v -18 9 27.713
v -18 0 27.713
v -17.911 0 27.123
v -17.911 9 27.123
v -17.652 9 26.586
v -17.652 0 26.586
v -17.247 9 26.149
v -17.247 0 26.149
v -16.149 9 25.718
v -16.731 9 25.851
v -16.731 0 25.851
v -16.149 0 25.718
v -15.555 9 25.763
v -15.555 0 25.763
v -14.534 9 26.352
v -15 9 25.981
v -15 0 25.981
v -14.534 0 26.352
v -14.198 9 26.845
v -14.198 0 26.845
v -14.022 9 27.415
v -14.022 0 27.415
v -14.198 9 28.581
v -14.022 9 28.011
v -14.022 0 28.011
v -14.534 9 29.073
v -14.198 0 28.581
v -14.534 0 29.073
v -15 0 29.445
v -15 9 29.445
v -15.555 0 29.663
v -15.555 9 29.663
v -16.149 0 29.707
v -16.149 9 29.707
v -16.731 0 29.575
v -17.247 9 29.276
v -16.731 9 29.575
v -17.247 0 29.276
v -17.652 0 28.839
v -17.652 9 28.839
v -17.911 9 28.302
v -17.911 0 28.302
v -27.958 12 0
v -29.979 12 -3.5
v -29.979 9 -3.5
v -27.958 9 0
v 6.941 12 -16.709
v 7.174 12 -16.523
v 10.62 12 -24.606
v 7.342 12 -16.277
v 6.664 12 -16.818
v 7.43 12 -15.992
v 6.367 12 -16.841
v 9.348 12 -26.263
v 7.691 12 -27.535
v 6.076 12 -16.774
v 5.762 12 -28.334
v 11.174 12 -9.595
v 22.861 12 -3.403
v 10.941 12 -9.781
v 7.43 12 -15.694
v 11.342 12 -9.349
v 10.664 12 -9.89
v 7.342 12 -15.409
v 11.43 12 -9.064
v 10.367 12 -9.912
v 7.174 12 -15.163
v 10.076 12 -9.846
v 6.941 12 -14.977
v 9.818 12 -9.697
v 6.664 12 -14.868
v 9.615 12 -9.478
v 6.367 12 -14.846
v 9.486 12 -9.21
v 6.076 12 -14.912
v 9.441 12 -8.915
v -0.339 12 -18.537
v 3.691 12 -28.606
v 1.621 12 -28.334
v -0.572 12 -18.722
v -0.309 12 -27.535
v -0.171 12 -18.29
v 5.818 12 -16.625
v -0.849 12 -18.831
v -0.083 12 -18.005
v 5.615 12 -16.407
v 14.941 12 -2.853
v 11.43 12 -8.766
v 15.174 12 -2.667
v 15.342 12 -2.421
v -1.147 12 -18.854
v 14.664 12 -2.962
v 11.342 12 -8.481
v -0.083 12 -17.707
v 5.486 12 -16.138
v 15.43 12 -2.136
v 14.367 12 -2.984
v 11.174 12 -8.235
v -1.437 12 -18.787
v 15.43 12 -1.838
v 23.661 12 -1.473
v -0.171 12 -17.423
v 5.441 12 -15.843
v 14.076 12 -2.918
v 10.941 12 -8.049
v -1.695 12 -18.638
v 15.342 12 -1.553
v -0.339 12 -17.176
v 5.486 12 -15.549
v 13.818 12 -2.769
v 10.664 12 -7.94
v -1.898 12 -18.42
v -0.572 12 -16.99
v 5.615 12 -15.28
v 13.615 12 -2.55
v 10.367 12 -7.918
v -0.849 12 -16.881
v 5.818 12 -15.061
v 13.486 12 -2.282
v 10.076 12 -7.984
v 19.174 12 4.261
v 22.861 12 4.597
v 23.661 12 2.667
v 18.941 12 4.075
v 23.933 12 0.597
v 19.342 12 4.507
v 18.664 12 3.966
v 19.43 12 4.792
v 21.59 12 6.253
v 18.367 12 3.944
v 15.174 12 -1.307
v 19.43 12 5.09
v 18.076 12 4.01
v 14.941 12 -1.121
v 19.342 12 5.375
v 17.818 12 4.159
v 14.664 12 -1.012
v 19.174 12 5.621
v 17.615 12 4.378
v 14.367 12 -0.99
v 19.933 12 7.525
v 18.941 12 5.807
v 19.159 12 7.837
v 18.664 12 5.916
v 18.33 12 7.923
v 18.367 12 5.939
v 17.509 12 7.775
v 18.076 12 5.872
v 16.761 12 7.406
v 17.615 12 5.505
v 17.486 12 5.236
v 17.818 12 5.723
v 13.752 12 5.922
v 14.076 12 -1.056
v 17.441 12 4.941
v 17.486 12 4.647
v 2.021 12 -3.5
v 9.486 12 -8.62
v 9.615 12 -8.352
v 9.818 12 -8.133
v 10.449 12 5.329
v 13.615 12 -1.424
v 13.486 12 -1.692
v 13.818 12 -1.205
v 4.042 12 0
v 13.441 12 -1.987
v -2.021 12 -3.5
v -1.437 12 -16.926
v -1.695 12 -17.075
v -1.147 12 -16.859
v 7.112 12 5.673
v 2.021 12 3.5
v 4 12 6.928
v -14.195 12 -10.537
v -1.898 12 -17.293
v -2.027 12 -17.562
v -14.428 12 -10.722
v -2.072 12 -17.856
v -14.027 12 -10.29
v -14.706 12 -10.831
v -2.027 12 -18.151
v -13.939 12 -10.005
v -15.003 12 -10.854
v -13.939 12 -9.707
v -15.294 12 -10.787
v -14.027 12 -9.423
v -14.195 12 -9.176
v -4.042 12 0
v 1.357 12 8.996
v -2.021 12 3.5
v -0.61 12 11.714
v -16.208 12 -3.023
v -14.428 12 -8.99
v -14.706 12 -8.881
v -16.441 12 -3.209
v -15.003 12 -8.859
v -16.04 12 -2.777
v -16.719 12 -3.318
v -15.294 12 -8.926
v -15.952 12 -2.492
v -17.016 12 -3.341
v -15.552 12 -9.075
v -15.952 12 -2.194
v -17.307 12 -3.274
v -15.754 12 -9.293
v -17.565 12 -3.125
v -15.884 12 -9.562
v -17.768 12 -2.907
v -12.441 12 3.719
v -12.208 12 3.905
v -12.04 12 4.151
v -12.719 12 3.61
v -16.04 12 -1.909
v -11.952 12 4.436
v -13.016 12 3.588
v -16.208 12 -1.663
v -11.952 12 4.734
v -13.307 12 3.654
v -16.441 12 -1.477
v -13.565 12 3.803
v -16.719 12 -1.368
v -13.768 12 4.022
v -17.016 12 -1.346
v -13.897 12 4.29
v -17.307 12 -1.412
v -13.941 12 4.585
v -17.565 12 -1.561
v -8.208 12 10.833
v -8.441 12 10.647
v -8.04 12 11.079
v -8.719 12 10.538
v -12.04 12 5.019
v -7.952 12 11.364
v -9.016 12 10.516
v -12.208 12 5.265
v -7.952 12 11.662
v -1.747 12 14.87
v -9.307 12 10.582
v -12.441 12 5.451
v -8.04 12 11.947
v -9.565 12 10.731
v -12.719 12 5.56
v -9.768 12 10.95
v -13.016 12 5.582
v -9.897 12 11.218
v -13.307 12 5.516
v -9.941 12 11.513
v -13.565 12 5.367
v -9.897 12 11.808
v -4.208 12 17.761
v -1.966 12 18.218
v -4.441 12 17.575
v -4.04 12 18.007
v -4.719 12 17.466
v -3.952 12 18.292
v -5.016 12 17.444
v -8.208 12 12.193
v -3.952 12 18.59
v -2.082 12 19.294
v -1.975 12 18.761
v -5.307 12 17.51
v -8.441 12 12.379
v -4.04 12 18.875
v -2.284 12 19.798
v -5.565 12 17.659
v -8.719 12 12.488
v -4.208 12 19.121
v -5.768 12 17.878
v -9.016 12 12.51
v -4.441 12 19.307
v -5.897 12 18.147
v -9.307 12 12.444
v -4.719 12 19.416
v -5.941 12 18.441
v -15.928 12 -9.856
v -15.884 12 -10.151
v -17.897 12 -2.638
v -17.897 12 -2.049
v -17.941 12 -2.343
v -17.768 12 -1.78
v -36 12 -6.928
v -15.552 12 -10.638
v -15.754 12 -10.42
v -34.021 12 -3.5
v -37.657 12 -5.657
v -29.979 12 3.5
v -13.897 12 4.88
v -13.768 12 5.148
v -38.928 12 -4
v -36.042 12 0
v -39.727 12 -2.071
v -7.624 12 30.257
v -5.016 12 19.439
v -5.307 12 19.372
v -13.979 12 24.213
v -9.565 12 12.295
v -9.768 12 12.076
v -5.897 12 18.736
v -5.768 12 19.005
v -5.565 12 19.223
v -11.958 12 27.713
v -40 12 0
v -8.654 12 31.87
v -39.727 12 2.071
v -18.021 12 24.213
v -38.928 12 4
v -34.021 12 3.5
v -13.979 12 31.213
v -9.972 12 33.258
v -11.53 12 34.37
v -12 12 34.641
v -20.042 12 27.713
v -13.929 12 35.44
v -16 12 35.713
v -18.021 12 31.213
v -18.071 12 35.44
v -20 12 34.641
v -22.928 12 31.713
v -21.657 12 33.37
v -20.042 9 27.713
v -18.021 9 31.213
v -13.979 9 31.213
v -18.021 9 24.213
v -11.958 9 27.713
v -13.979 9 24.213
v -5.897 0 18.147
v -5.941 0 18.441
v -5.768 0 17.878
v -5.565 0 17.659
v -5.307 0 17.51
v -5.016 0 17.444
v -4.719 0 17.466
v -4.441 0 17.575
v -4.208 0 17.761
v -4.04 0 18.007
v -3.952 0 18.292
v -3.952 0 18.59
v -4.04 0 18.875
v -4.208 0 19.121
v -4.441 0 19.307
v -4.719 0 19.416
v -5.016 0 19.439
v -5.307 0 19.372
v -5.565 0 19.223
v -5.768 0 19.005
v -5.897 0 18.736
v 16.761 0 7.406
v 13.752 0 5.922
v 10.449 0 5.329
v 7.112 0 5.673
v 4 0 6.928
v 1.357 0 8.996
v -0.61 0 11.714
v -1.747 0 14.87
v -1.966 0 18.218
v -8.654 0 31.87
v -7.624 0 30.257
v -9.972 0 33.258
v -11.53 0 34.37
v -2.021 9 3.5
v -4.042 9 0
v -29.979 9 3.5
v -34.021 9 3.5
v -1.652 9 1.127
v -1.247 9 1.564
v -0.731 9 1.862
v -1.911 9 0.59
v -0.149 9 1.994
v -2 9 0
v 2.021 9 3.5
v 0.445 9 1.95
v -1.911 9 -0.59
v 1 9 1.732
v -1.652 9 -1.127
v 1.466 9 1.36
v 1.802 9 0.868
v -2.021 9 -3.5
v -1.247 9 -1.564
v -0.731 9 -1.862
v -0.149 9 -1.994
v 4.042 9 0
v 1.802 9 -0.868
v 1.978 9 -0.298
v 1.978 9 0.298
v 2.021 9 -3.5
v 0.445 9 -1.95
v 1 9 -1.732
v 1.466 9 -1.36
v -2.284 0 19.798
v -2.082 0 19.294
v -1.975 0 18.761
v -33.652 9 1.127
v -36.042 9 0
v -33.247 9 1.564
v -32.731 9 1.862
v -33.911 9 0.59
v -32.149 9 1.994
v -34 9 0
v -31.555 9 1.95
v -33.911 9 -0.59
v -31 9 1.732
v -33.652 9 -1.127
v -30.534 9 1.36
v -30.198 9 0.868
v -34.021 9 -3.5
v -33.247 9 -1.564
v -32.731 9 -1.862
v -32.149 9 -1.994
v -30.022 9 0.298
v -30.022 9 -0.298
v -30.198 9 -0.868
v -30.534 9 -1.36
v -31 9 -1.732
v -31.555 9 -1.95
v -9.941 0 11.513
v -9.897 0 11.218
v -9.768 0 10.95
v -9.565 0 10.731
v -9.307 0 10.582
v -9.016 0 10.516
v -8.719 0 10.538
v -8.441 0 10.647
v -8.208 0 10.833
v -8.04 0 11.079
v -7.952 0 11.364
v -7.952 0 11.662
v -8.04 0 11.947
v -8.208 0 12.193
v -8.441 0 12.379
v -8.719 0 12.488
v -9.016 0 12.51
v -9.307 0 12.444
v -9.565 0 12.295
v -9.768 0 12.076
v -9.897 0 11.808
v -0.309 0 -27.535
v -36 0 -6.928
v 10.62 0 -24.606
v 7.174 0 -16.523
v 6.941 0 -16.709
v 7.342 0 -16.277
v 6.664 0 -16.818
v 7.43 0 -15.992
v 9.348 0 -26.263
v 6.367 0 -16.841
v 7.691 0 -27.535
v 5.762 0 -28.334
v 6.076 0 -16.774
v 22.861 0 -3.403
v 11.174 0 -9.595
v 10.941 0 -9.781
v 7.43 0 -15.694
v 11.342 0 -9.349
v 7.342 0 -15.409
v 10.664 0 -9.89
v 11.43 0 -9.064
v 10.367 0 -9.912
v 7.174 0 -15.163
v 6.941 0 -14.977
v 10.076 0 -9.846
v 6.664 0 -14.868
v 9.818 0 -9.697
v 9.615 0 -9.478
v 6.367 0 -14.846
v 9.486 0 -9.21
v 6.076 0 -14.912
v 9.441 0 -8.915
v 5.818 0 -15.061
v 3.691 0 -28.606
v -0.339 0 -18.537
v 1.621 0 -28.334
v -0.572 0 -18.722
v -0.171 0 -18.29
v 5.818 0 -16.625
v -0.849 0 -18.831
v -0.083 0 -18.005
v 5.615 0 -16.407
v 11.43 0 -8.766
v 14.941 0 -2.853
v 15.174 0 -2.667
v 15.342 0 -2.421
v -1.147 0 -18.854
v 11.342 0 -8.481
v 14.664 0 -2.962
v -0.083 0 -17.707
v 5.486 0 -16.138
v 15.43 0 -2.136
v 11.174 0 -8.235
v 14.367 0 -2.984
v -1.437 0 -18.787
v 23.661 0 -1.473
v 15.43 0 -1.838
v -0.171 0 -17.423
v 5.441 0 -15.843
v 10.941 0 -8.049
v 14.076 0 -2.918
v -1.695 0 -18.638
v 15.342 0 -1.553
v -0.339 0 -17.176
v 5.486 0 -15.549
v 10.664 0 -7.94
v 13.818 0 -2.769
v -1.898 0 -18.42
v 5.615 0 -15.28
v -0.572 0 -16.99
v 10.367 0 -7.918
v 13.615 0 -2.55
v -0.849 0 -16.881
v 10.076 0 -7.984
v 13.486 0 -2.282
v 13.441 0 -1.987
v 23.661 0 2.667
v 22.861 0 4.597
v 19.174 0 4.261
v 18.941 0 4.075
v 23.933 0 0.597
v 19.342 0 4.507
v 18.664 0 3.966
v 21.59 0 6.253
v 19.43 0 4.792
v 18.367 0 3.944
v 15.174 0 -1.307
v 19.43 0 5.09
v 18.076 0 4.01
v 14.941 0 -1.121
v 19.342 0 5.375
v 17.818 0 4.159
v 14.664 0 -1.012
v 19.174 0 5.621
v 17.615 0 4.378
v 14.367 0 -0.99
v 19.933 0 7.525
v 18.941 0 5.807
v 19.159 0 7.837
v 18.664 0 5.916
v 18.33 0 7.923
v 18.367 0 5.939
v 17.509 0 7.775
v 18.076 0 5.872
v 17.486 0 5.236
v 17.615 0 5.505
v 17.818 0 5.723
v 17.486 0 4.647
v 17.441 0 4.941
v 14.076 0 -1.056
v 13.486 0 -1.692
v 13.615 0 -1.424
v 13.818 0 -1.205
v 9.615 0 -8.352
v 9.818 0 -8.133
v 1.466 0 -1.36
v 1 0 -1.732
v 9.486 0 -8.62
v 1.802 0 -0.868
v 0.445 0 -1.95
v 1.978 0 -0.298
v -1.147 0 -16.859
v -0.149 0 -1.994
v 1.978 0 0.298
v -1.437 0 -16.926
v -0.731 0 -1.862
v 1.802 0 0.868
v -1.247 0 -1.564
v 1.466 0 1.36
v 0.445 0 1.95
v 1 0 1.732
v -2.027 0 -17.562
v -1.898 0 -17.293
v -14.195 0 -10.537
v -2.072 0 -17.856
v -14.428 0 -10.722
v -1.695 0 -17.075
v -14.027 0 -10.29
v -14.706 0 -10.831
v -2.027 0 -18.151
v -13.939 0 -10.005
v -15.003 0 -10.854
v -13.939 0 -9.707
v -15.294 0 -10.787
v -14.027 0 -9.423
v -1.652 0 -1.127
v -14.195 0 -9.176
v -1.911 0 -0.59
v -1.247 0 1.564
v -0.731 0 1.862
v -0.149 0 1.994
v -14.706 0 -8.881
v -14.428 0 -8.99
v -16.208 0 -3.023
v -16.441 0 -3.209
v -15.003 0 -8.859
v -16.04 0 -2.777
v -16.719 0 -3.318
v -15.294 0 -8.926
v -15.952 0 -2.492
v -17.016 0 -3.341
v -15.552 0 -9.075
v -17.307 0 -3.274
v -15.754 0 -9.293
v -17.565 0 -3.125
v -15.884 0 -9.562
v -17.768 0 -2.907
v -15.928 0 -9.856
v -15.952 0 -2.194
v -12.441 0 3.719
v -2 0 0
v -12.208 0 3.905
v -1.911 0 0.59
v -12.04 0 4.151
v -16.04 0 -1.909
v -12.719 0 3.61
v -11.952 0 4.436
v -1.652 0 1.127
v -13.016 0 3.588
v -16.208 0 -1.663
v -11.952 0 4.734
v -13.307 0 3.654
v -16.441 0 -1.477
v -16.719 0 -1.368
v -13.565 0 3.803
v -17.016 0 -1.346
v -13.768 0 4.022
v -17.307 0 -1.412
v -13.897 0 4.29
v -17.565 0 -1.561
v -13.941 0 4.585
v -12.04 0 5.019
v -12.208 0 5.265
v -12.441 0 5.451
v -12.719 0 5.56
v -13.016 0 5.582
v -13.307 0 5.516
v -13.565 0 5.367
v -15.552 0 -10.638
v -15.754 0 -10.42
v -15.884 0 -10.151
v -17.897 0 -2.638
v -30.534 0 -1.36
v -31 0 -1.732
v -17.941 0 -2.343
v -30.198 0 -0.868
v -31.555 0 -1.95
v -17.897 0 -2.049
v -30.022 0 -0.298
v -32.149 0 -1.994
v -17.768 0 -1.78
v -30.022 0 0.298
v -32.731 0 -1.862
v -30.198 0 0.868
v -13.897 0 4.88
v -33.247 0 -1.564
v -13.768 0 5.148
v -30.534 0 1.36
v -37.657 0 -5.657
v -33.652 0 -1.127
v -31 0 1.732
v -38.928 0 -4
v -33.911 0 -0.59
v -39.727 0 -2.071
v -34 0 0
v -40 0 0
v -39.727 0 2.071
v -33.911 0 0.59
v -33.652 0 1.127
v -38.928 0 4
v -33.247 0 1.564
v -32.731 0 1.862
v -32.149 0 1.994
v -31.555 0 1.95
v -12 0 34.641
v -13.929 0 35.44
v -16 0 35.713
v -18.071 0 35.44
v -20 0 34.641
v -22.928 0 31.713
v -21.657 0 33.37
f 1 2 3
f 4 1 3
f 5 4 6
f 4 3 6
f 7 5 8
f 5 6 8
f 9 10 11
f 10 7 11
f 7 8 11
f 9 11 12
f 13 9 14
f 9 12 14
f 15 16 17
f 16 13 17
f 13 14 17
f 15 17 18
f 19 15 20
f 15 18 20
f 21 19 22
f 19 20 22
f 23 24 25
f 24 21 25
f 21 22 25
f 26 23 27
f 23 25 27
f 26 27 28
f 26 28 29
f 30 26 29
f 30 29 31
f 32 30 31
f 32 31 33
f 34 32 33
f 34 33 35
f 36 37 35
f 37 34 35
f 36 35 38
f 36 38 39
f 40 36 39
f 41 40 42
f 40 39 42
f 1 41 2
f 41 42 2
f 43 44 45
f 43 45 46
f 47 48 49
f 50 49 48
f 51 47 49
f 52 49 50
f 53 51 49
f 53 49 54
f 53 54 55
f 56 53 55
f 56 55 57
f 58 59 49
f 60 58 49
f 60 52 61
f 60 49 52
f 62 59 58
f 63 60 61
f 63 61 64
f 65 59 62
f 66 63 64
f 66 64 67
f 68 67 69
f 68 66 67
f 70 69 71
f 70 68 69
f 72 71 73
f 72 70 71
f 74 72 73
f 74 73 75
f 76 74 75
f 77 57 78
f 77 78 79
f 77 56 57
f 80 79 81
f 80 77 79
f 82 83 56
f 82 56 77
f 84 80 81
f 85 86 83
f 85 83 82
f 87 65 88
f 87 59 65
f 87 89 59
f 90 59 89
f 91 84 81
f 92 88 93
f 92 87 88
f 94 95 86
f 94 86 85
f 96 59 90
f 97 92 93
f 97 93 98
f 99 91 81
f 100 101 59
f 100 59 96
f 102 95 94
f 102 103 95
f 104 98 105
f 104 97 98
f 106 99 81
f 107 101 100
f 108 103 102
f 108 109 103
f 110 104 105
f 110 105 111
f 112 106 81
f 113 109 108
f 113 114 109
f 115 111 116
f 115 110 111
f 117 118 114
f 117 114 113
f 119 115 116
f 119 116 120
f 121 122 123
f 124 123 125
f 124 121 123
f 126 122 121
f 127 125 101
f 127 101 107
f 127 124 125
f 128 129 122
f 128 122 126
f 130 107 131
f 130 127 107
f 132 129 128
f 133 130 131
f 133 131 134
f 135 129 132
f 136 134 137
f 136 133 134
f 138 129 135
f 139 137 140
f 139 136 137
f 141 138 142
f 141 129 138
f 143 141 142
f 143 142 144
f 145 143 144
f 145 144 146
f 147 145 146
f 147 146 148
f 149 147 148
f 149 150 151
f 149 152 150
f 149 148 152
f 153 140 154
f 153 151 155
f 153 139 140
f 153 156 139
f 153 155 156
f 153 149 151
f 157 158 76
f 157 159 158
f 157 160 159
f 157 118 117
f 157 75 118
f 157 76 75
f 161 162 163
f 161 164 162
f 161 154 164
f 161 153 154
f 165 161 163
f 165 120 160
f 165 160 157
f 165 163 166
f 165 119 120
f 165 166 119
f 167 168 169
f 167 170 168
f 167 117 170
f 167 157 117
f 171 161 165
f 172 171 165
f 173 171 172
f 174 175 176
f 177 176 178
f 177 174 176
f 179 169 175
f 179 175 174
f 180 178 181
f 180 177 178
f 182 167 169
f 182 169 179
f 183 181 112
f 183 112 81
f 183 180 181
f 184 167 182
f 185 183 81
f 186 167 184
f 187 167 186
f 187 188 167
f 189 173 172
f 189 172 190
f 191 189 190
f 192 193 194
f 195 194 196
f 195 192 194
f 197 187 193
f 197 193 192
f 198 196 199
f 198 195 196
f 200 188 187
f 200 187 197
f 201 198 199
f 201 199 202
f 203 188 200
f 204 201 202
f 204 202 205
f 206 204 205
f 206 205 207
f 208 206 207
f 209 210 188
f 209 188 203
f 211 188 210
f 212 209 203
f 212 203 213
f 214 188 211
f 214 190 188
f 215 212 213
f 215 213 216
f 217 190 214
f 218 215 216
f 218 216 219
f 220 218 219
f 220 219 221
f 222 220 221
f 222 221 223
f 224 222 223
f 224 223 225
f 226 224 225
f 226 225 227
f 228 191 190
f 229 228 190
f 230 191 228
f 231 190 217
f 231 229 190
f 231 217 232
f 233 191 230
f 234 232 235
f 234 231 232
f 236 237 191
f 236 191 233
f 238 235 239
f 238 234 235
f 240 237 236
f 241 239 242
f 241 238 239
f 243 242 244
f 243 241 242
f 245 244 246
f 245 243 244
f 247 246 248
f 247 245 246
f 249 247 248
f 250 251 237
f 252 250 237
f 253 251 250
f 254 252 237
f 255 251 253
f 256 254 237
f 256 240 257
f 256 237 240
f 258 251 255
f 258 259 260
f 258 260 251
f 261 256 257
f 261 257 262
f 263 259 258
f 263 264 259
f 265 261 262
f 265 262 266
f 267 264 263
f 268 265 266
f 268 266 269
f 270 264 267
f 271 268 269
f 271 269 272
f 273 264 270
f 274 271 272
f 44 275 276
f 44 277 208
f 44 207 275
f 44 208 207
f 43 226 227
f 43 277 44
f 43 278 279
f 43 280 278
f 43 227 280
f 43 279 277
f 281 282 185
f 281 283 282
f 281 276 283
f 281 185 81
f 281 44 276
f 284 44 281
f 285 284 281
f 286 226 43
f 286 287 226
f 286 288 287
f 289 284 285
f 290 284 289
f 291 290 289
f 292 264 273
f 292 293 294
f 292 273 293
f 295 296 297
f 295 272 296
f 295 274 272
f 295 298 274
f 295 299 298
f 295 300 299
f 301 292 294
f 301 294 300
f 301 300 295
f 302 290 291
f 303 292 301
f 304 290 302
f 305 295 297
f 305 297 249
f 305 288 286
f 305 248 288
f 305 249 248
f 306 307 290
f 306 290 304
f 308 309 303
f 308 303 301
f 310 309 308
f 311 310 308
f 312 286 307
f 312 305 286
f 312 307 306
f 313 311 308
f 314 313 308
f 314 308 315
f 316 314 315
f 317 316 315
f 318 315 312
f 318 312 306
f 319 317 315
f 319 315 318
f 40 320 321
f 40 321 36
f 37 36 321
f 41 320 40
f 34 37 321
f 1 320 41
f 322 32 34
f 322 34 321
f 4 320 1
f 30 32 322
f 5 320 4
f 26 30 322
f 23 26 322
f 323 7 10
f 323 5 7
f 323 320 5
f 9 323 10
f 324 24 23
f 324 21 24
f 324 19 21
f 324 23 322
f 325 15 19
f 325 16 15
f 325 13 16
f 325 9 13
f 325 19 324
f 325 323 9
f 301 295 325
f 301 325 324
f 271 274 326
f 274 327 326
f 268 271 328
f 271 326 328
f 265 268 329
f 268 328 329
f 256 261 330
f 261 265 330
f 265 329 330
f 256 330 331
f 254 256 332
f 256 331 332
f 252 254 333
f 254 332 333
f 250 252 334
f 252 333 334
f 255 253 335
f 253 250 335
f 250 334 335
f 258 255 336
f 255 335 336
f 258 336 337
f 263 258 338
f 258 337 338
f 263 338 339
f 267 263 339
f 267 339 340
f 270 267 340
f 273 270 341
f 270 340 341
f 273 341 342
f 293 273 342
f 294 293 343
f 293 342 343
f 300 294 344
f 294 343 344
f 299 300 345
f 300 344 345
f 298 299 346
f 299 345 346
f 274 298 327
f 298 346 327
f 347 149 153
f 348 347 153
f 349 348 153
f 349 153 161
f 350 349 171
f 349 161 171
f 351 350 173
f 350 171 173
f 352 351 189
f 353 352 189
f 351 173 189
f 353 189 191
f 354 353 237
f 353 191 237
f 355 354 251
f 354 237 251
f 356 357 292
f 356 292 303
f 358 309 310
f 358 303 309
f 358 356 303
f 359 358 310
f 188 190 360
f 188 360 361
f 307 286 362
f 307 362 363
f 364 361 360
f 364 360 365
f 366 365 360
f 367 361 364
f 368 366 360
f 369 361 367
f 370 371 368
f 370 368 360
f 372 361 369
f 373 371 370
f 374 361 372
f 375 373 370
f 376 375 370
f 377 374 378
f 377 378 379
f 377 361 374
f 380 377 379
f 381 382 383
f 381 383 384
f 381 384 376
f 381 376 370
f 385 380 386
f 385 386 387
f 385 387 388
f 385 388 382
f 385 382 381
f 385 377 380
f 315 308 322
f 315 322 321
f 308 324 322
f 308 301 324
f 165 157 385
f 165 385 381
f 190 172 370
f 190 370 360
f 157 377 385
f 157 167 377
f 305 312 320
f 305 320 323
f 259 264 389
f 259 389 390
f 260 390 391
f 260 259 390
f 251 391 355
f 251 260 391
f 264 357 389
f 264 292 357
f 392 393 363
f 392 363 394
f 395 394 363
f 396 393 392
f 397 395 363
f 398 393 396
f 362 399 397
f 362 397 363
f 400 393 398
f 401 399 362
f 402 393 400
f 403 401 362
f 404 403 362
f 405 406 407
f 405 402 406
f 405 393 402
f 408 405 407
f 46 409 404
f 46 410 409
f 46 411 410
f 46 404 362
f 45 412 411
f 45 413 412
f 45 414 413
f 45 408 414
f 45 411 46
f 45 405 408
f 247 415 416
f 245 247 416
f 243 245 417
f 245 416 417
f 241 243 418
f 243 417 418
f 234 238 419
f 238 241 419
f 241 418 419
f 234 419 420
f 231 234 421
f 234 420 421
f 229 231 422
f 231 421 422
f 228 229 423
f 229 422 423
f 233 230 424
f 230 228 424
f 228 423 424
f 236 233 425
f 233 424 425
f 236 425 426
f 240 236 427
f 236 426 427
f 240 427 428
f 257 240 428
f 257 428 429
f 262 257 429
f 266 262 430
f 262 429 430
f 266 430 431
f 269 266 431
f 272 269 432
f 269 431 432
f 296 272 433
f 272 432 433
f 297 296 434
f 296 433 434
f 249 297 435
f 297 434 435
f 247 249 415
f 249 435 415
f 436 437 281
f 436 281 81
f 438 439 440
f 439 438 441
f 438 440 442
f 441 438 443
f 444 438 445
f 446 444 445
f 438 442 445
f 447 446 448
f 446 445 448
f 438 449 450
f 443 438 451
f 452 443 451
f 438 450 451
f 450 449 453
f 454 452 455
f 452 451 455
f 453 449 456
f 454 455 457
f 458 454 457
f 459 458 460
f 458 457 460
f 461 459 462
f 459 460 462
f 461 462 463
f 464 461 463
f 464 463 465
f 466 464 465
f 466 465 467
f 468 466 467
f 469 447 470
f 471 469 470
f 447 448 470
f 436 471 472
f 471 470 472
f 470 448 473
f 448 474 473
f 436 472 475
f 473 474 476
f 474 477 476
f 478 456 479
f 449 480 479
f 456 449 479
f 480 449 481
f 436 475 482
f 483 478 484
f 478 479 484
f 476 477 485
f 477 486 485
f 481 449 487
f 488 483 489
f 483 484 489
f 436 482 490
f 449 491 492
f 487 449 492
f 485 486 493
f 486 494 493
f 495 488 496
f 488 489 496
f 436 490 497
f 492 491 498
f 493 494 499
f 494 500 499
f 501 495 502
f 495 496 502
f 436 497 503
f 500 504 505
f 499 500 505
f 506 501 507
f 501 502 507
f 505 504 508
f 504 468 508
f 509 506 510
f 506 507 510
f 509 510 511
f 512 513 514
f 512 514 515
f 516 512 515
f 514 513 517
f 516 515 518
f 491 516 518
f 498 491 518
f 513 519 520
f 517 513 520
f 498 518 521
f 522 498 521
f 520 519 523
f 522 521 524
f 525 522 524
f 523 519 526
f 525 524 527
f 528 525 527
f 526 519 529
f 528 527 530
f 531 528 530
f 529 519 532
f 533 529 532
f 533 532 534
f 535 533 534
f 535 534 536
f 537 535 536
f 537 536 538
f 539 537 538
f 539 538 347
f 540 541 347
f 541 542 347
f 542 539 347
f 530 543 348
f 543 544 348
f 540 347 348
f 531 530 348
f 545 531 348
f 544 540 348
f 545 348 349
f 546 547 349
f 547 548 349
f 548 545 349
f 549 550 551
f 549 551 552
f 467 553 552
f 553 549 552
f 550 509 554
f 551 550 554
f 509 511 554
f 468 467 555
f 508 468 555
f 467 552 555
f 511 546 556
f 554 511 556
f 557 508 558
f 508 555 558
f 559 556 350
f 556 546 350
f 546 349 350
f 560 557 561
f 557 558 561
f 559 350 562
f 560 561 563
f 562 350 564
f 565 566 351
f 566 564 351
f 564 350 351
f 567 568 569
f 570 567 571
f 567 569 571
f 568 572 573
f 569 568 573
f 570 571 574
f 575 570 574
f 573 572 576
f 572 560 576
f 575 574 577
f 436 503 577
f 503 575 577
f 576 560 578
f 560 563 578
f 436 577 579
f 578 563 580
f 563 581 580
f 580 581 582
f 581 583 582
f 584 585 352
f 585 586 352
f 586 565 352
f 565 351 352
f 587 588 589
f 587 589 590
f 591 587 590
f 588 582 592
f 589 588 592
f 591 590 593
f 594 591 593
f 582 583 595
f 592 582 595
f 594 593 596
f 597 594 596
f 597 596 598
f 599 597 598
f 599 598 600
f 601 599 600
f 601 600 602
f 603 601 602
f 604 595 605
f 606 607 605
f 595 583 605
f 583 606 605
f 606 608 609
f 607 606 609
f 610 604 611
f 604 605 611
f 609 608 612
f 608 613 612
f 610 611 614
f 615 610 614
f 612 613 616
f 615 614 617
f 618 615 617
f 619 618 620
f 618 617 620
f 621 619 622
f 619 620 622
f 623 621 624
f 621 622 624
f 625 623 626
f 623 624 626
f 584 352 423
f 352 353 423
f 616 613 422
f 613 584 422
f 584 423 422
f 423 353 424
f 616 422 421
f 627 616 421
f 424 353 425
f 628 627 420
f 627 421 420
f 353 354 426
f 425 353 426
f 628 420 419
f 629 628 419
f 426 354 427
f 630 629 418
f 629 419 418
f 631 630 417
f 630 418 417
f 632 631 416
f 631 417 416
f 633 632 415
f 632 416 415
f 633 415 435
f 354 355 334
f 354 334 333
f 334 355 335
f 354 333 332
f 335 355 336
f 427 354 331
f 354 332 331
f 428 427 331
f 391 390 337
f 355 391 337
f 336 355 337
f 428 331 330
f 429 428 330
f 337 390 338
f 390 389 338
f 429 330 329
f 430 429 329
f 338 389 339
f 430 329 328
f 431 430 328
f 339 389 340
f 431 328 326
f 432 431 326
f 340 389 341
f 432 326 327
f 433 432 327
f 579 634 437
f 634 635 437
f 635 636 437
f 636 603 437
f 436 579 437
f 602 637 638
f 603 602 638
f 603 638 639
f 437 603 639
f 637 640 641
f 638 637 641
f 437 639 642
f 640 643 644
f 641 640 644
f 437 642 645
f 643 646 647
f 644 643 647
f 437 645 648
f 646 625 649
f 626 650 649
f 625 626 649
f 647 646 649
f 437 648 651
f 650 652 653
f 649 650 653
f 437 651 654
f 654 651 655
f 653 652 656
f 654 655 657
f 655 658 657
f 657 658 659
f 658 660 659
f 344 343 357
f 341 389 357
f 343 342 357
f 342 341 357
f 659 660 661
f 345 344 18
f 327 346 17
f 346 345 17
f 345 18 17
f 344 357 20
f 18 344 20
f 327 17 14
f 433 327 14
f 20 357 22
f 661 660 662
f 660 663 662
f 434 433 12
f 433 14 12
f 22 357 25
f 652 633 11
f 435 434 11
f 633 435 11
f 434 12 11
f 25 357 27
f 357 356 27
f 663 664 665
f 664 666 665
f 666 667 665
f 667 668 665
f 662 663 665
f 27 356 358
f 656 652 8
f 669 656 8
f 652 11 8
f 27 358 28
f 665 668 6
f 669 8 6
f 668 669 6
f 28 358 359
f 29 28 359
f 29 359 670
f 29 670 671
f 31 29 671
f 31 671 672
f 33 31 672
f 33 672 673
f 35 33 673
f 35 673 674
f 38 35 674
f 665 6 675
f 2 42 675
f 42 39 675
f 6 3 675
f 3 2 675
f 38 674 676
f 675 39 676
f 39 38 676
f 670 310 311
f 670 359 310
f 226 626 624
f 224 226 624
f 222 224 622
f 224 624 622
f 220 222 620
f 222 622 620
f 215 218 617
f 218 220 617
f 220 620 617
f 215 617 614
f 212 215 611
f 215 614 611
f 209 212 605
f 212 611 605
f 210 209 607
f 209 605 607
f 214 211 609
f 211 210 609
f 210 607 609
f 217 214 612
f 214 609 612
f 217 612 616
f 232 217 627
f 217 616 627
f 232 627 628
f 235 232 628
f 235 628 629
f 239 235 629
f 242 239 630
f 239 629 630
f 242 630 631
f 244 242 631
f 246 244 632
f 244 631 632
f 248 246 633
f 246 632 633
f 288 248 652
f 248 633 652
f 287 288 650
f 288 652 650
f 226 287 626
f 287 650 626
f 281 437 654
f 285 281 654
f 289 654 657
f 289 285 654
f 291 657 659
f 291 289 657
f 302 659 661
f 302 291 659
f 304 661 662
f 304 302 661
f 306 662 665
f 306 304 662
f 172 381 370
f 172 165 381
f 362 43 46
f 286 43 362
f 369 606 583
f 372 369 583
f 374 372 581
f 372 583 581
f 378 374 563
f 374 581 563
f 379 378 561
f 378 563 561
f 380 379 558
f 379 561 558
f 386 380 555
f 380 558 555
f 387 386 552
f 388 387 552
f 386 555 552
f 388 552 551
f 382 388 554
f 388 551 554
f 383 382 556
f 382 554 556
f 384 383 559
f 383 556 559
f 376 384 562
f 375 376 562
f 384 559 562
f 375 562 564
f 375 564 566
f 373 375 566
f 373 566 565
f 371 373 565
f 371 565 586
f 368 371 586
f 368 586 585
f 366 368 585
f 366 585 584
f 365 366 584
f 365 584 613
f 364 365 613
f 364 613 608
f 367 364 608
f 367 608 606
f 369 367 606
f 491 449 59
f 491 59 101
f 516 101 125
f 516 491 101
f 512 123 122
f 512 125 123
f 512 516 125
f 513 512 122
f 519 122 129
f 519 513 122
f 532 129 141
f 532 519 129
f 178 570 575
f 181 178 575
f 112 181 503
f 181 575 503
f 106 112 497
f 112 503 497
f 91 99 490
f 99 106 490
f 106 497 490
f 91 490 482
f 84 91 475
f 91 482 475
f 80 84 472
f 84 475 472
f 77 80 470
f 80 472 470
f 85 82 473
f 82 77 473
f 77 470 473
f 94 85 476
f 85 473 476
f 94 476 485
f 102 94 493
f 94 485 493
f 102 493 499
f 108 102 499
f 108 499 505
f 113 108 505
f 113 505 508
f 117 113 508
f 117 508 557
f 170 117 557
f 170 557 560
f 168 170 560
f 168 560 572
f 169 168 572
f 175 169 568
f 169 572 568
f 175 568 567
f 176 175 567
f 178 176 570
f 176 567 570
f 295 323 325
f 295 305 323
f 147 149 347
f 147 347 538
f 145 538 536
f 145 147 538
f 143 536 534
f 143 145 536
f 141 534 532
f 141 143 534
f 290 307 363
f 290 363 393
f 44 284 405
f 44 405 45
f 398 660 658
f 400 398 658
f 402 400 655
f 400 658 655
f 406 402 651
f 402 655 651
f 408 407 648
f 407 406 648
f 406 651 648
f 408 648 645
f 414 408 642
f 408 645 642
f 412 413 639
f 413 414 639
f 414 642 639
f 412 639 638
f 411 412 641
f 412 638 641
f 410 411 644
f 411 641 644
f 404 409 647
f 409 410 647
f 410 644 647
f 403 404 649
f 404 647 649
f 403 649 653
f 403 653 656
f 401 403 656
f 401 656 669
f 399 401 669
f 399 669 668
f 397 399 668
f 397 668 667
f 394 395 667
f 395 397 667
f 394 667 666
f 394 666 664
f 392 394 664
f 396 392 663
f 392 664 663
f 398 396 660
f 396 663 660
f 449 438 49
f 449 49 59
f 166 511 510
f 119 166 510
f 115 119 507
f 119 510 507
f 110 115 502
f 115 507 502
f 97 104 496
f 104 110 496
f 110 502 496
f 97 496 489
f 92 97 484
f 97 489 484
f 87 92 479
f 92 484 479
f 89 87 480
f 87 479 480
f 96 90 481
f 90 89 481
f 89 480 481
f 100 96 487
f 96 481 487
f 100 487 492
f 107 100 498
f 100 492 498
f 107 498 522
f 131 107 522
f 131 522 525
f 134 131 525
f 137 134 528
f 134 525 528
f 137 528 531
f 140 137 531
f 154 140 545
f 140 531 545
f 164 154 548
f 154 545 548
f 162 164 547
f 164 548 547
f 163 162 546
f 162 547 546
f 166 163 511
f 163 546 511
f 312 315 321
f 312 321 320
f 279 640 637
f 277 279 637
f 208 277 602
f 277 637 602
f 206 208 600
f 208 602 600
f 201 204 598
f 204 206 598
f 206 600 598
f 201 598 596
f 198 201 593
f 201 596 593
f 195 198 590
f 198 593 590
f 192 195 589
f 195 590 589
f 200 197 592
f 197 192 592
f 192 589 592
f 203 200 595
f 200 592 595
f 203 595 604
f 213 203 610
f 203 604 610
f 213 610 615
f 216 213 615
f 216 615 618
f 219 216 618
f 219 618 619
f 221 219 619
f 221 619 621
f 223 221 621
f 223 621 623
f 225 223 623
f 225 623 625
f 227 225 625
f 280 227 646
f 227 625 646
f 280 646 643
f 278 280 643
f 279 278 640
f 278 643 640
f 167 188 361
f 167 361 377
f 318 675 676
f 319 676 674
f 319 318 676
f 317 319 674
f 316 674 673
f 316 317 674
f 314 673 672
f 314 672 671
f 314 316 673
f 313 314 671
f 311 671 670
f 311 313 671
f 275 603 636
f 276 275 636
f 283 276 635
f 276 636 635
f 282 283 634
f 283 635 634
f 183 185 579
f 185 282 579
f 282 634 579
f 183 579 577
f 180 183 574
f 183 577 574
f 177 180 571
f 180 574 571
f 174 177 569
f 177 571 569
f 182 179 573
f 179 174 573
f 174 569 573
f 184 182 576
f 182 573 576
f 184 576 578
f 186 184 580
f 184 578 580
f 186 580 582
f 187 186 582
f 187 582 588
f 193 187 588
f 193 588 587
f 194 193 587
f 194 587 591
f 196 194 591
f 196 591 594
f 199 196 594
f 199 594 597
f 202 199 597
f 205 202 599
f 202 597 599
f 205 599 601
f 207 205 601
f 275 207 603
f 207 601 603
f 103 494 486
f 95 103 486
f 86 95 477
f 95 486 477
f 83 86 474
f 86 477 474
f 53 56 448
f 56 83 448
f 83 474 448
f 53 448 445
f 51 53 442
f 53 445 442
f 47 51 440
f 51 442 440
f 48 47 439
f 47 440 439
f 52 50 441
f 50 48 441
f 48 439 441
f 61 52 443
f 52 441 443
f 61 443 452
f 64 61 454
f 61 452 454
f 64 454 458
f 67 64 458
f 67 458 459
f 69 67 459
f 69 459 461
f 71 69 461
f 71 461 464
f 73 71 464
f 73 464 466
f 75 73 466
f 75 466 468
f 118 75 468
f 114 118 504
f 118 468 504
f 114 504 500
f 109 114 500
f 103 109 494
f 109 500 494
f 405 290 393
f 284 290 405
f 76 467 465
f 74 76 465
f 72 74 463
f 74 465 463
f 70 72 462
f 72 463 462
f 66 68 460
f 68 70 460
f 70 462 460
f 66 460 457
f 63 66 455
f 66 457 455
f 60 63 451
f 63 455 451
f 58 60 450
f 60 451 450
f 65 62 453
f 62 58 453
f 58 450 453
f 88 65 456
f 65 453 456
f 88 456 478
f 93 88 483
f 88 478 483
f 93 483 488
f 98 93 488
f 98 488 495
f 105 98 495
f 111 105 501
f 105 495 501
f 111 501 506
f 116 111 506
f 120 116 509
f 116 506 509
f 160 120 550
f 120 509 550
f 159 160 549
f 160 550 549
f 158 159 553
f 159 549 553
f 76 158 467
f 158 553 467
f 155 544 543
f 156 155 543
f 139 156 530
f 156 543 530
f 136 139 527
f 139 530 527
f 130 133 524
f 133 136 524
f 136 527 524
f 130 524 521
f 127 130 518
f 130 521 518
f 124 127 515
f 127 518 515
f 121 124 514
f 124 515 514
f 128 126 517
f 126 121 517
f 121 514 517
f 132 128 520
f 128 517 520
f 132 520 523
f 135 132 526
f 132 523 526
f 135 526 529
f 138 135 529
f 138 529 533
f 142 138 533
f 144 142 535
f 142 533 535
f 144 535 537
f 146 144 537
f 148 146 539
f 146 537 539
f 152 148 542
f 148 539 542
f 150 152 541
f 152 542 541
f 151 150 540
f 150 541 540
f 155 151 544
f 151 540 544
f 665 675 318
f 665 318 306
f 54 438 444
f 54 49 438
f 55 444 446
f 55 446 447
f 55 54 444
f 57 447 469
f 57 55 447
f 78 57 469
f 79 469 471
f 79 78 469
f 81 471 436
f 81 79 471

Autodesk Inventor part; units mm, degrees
ref_plane "YZ Plane" through (0, 0, 0) normal (1, 0, 0) x (0, 1, 0)
ref_plane "XZ Plane" through (0, 0, 0) normal (0, 1, 0) x (-1, 0, 0)
ref_plane "XY Plane" through (0, 0, 0) normal (0, 0, 1) x (1, 0, 0)
sketch "Esquisse1" plane through (0, 0, 0) normal (0, 1, 0) x (-1, 0, 0)
  line L0 (0, 0) -> (32, 0) construction
  line L1 (32, 0) -> (16, 27.7128) construction
  line L2 (16, 27.7128) -> (0, 0) construction
  line L3 (-10.3913, 17.9982) -> (9.0252, -15.6322) construction
  line L4 (8, -13.8564) -> (32, 0) construction
  line L5 (8, -13.8564) -> (14.9282, -9.8564) construction
  line L6 (8, -13.8564) -> (-10, 17.3205) construction
  line L7 (-10, 17.3205) -> (1.6913, 24.0705) construction
  line L8 (1.6913, 24.0705) -> (4.9413, 18.4413) construction
  line L9 (4.9413, 18.4413) -> (8.9413, 11.5131) construction
  line L10 (8.9413, 11.5131) -> (12.9413, 4.5849) construction
  line L11 (12.9413, 4.5849) -> (16.9413, -2.3433) construction
  circle A0 centre (8.9413, 11.5131) radius 1
  circle A1 centre (12.9413, 4.5849) radius 1
  circle A2 centre (16.9413, -2.3433) radius 1
  circle A3 centre (14.9282, -9.8564) radius 1
  circle A4 centre (4.9413, 18.4413) radius 1
  circle A5 centre (-14.4413, -1.9869) radius 1
  circle A6 centre (-10.4413, -8.9151) radius 1
  circle A7 centre (-6.4413, -15.8433) radius 1
  circle A8 centre (1.0718, -17.8564) radius 1
  circle A9 centre (-18.4413, 4.9413) radius 1
  circle A10 centre (-10, 17.3205) radius 11.6 construction
  line L12 (32, 0) -> (36, -6.9282) construction
  line L13 (36.0415, 0) -> (34.0207, -3.5) construction
  line L14 (34.0207, -3.5) -> (29.9793, -3.5) construction
  line L15 (29.9793, -3.5) -> (27.9585, 0) construction
  line L16 (27.9585, 0) -> (29.9793, 3.5) construction
  line L17 (29.9793, 3.5) -> (34.0207, 3.5) construction
  line L18 (34.0207, 3.5) -> (36.0415, 0) construction
  line L19 (34.0207, 3.5) -> (34.0207, -3.5) construction
  circle A11 centre (16, 27.7128) radius 2
  circle A12 centre (32, 0) radius 2
  line L20 (32, 0) -> (38.9282, 4) construction
  line L21 (-6.4413, -15.8433) -> (-13.3695, -19.8433) construction
  line L22 (42.9282, -2.9282) -> (-6.6195, -31.5346)
  line L23 (-6.6195, -31.5346) -> (-30.6195, 10.0346)
  line L24 (-30.6195, 10.0346) -> (18.9282, 38.641)
  line L25 (18.9282, 38.641) -> (42.9282, -2.9282)
  line L26 (8, -13.8564) -> (12, -20.7846) construction
  line L27 (16, 27.7128) -> (12, 34.641) construction
  circle A13 centre (0, 0) radius 2
  dimension "d0" = 32
  dimension "d1" = 32
  dimension "d2" = 60
  dimension "d4" = 8
  dimension "d6" = 36
  dimension "d7" = 13.5
  dimension "d8" = 6.5
  dimension "d9" = 8
  dimension "d10" = 8
  dimension "d11" = 8
  dimension "d13" = 2
  dimension "d14" = 11.6
  dimension "d15" = 8
  dimension "d16" = 7
  dimension "d17" = 4
  dimension "d19" = 8
  dimension "d20" = 8
  dimension "d26" = 8
  dimension "d27" = 8
extrude "Extrusion1" add sketch "Esquisse1" along normal blind 12
sketch "Esquisse5" plane through (0, 12, 0) normal (0, 1, 0) x (1, 0, 0)
  circle A0 centre (-32, 0) radius 2 projected
  circle A1 centre (-16, -27.7128) radius 2 projected
  line L0 (-42.9282, 2.9282) -> (-18.9282, -38.641) projected
  line L1 (-27.9585, 0) -> (-29.9793, -3.5)
  line L2 (-29.9793, -3.5) -> (-34.0207, -3.5)
  line L3 (-34.0207, -3.5) -> (-36.0415, 0)
  line L4 (-36.0415, 0) -> (-34.0207, 3.5)
  line L5 (-34.0207, 3.5) -> (-29.9793, 3.5)
  line L6 (-29.9793, 3.5) -> (-27.9585, 0)
  line L7 (-18.0207, -24.2128) -> (-13.9793, -24.2128)
  line L8 (-13.9793, -24.2128) -> (-11.9585, -27.7128)
  line L9 (-11.9585, -27.7128) -> (-13.9793, -31.2128)
  line L10 (-13.9793, -31.2128) -> (-18.0207, -31.2128)
  line L11 (-18.0207, -31.2128) -> (-20.0415, -27.7128)
  line L12 (-20.0415, -27.7128) -> (-18.0207, -24.2128)
  line L13 (-4.0415, 0) -> (-2.0207, 3.5)
  line L14 (-2.0207, 3.5) -> (2.0207, 3.5)
  line L15 (2.0207, 3.5) -> (4.0415, 0)
  line L16 (4.0415, 0) -> (2.0207, -3.5)
  line L17 (2.0207, -3.5) -> (-2.0207, -3.5)
  line L18 (-2.0207, -3.5) -> (-4.0415, 0)
  line L19 (-13.9793, -24.2128) -> (-20.0415, -27.7128) construction
  point P0 (0, 0)
  point P1 (0, 0)
  dimension "d51" = 7
extrude "Extrusion2" cut sketch "Esquisse5" against normal blind 3
sketch "Esquisse6" plane through (0, 12, 0) normal (0, 1, 0) x (1, 0, 0)
  circle A0 centre (18.4413, -4.9413) radius 1 projected
  circle A1 centre (-4.9413, -18.4413) radius 1 projected
  line L0 (-18.9282, -38.641) -> (30.6195, -10.0346) projected
  line L1 (30.6195, -10.0346) -> (6.6195, 31.5346) projected
  line L2 (18.4413, -4.9413) -> (21.6913, -10.5705) construction
  line L3 (21.6913, -10.5705) -> (10, -17.3205) construction
  circle A2 centre (10, -17.3205) radius 12 construction
  line L4 (-11.9585, -27.7128) -> (-8.9689, -32.891) construction
  line L5 (-42.9282, 2.9282) -> (-18.9282, -38.641) projected
  circle A3 centre (-4.9413, -18.4413) radius 2.9833 construction
  line L6 (-8.9689, -32.891) -> (-2.2843, -19.7979)
  arc A4 (-2.2843, -19.7979) -> (-1.9664, -18.2182) centre (-4.9413, -18.4413) ccw
  circle A5 centre (18.4413, -4.9413) radius 2.9833 construction
  line L7 (19.933, -7.525) -> (26.8612, -3.525)
  arc A6 (16.7606, -7.4062) -> (-1.9664, -18.2182) centre (10, -17.3205) ccw
  arc A7 (16.7606, -7.4062) -> (19.933, -7.525) centre (18.4413, -4.9413) ccw
  point P0 (0, 0)
  dimension "d39" = 12
  dimension "d37" = 6.5
  dimension "d38" = 13.5
extrude "Extrusion3" cut sketch "Esquisse6" against normal through all contours L6 A4 A6 A7 L7 L1 L0
fillet "Congé3" radius 10 1 edges at (-8.9689, 6, 32.891)
fillet "Congé4" radius 8 1 edges at (26.8612, 6, 3.525)
fillet "Congé5" radius 8 1 edges at (6.6195, 6, -31.5346)
fillet "Congé6" radius 8 1 edges at (-18.9282, 6, 38.641)
fillet "Congé7" radius 8 1 edges at (-42.9282, 6, -2.9282)
properties part number "joint3+ax12imprint"
